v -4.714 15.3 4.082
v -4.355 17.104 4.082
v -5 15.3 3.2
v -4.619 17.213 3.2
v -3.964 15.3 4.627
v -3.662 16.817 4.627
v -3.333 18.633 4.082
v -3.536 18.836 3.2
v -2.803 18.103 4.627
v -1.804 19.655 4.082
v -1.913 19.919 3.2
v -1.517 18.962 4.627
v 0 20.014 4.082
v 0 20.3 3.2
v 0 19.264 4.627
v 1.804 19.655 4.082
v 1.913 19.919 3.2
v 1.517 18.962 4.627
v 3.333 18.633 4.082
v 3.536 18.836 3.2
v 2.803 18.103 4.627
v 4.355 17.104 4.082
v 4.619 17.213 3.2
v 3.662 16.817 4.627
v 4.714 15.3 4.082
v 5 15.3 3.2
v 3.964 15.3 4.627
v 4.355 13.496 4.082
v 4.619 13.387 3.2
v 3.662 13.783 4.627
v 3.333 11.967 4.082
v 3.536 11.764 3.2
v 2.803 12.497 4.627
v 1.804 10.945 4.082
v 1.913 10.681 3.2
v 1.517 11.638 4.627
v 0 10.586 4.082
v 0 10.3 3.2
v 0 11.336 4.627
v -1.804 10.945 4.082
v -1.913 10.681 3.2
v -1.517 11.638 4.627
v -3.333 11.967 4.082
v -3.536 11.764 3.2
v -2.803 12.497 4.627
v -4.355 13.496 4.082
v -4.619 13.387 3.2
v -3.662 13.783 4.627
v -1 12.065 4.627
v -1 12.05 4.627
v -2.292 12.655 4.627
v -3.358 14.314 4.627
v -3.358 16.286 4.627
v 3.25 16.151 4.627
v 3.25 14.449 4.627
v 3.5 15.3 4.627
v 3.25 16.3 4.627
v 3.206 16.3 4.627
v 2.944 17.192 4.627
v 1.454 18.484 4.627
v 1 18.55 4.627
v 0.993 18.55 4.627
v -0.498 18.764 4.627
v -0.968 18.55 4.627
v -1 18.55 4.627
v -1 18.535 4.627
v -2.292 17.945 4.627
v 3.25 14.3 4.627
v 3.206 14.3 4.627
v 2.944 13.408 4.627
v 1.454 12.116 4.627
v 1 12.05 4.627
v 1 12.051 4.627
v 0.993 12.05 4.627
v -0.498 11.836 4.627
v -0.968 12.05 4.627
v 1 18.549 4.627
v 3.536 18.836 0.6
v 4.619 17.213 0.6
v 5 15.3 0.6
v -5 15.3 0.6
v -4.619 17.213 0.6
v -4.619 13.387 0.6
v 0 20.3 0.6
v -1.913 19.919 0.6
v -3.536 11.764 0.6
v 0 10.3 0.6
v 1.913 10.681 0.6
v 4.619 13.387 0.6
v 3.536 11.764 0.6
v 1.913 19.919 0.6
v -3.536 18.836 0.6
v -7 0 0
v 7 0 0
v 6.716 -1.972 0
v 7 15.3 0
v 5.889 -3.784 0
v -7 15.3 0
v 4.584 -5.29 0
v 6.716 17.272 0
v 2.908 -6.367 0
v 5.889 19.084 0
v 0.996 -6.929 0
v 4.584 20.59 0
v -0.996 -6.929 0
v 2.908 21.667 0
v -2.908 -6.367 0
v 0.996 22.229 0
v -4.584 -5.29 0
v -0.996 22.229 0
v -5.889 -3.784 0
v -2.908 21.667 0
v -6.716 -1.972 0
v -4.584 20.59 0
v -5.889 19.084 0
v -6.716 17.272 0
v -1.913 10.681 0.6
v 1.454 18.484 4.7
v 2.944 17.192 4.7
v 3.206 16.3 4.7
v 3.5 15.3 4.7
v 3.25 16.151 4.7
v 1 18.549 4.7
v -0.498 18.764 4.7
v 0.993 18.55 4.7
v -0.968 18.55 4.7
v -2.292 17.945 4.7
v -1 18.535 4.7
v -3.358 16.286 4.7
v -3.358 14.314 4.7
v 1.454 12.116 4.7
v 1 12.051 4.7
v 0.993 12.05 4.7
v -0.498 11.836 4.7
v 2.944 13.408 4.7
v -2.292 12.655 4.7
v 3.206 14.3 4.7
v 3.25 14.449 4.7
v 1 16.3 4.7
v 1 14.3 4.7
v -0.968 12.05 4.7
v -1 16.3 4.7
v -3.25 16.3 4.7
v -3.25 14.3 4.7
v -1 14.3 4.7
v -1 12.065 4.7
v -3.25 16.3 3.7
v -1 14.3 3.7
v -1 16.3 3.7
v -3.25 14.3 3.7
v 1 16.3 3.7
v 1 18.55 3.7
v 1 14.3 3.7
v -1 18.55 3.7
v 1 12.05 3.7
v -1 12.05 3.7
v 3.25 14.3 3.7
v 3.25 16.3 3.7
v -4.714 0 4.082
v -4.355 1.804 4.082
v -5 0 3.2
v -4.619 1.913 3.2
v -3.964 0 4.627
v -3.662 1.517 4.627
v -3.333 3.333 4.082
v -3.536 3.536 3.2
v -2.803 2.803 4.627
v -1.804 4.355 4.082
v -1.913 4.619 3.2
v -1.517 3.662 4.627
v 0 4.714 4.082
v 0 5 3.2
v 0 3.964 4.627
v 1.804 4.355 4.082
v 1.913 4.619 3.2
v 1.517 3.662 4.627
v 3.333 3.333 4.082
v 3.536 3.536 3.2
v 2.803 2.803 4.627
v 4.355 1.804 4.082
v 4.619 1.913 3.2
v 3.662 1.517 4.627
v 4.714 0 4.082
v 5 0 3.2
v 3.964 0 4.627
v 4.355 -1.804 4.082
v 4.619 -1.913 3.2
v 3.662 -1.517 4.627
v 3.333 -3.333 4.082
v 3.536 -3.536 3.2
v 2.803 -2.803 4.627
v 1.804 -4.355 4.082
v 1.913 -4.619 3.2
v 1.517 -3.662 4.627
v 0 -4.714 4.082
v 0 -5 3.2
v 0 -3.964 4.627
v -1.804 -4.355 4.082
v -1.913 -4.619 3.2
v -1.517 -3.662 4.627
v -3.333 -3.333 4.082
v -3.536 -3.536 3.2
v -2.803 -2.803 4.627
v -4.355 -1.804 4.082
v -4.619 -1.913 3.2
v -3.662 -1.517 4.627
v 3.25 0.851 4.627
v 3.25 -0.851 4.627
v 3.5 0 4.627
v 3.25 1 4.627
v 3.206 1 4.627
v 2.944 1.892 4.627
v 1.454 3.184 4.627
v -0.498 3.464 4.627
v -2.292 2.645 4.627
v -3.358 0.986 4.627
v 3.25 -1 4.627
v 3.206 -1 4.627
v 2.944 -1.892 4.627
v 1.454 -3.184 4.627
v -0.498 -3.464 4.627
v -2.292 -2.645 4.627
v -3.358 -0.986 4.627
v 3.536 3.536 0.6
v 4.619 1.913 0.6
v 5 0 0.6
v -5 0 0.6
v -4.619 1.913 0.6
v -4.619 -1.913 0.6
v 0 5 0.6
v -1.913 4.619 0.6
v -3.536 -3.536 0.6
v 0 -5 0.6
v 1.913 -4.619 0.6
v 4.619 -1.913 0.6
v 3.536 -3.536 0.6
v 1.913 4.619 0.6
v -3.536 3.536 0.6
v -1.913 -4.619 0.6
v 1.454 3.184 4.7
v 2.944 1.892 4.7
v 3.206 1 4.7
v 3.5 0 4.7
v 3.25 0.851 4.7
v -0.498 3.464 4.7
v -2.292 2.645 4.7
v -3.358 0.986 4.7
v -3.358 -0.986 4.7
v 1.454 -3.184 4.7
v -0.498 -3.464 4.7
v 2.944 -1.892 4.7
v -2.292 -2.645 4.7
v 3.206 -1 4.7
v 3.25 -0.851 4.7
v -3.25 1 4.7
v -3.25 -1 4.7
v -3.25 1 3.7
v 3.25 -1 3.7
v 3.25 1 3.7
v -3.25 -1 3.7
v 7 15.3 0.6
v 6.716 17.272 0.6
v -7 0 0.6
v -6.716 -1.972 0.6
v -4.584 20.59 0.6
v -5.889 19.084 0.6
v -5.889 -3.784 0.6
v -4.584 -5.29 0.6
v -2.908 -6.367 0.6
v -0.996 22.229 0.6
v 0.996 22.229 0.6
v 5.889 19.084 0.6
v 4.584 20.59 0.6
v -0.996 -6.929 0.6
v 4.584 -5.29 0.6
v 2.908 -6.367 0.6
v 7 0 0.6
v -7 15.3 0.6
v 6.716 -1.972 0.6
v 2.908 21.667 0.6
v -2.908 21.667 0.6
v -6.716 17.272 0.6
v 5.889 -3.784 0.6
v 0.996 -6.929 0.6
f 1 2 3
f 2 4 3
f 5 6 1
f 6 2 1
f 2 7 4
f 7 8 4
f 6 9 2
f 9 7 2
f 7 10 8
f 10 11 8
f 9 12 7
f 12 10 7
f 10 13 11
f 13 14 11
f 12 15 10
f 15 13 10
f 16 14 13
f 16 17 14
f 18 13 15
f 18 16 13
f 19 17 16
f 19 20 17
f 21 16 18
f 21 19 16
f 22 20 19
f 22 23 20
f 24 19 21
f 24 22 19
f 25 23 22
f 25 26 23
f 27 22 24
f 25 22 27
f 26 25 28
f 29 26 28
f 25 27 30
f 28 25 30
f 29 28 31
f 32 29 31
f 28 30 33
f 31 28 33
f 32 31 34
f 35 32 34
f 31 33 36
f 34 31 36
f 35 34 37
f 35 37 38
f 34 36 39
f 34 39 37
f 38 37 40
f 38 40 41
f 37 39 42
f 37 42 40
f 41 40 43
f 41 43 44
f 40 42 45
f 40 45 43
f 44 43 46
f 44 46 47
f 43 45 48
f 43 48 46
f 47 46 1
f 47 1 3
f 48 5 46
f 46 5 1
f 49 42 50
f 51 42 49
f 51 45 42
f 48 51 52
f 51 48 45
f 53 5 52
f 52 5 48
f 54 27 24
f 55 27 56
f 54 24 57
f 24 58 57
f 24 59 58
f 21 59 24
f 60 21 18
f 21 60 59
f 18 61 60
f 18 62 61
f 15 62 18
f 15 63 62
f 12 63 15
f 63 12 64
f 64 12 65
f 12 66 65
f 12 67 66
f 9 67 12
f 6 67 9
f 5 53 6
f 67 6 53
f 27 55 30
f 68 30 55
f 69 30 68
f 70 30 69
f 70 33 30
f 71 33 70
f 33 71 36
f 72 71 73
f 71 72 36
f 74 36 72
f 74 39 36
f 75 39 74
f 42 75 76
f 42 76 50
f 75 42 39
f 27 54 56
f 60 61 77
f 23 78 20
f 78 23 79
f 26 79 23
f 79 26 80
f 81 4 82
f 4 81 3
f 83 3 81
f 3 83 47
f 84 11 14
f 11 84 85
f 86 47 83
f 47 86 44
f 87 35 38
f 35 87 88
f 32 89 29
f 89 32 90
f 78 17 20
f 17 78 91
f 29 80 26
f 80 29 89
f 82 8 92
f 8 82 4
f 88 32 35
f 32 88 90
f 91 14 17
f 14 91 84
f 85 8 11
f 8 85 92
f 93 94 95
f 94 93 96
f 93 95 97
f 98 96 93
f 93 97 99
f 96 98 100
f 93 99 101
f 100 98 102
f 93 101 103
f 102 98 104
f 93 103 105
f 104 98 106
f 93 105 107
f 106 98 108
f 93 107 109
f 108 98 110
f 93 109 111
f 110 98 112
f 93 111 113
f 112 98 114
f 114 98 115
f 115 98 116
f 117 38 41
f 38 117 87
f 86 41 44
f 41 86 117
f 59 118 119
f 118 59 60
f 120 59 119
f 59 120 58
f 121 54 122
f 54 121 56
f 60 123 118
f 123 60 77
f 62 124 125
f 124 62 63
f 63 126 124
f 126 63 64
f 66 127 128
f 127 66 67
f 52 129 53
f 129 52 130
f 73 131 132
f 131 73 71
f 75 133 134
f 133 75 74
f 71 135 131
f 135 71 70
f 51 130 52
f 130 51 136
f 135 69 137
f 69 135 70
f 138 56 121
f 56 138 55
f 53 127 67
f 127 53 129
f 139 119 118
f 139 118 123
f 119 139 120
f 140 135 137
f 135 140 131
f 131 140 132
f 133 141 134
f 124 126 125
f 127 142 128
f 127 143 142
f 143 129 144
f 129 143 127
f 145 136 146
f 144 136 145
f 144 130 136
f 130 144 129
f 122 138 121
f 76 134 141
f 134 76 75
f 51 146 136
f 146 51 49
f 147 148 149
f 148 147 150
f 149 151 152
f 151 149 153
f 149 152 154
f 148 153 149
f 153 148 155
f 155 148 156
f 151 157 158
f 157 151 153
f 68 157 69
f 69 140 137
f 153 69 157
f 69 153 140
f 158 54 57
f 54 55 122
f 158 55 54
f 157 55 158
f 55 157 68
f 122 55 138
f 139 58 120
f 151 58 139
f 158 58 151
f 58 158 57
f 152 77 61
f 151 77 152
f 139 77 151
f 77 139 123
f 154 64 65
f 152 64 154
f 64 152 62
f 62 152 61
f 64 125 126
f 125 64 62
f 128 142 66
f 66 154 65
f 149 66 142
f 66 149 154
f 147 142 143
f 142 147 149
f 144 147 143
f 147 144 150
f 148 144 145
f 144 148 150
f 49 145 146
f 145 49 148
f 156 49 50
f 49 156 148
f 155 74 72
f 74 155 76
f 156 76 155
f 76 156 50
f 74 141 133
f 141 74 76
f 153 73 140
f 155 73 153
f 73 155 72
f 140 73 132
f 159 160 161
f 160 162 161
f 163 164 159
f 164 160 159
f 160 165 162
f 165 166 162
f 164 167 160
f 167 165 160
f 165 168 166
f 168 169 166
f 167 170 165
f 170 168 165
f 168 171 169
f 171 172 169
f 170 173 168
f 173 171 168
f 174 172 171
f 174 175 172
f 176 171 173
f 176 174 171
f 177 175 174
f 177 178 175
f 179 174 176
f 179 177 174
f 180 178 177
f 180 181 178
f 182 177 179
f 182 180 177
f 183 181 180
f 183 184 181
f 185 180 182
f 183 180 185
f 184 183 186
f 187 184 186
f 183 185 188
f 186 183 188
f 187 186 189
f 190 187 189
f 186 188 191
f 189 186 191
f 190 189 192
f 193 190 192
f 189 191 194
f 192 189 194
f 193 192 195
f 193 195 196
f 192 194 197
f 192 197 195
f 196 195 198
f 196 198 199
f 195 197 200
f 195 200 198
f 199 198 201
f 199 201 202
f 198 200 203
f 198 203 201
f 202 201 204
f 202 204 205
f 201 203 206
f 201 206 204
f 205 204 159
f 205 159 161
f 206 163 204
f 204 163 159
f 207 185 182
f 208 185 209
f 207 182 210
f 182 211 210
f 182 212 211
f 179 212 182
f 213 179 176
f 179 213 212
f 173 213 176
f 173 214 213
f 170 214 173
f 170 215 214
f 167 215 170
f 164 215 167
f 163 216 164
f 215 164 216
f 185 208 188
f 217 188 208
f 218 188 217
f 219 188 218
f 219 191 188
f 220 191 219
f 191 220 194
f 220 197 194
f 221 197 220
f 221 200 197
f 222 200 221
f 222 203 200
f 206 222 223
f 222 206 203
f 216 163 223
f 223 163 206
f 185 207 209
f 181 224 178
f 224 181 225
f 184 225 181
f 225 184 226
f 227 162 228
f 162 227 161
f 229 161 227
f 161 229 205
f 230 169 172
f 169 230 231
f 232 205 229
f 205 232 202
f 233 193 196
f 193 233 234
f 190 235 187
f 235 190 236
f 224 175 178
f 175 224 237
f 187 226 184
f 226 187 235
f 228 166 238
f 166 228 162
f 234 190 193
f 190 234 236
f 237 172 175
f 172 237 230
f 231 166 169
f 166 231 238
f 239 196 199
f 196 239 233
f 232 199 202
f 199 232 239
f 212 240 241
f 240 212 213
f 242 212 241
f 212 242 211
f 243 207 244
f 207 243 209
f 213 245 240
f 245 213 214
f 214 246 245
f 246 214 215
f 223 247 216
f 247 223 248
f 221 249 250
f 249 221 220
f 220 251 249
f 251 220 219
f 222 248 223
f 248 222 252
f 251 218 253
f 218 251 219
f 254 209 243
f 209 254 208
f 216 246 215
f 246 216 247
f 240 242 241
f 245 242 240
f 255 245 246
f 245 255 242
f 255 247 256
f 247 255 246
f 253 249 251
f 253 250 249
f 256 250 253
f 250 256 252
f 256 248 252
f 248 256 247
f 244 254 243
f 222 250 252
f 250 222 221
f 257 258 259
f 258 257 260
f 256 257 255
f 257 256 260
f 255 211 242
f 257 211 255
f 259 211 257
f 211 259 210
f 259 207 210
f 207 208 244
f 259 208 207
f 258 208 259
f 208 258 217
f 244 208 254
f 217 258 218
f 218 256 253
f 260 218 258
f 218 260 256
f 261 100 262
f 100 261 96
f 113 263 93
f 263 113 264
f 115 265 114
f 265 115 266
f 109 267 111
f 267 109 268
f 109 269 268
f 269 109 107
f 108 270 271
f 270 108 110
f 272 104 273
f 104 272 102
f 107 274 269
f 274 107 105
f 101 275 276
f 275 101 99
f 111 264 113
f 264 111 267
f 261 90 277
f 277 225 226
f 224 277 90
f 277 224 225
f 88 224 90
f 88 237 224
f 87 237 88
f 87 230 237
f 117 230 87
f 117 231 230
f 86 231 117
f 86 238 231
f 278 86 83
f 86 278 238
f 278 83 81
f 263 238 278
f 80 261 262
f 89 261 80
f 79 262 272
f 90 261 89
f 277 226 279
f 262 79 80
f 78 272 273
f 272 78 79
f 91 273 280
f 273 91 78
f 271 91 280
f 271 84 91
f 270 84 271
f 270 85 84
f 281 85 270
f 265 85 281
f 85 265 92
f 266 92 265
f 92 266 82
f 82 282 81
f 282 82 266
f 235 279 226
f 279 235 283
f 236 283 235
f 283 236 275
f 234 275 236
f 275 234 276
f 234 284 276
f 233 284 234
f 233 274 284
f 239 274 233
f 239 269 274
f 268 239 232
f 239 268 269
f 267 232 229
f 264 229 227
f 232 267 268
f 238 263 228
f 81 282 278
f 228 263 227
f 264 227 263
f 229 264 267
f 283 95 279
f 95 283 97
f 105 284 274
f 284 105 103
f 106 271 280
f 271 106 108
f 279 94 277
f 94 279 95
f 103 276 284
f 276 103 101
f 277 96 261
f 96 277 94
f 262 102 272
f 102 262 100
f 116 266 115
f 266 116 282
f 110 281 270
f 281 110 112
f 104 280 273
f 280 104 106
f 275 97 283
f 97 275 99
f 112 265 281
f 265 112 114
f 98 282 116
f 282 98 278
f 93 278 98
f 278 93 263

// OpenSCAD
pitch=2.55;
width = 10;
thickness=0.6;
height=thickness + 4.1;
extra=2;
roundness=1.5;
textHeight=1;

module button(x,y)
{
    translate( [x*pitch, y*pitch] ) {
        difference() {
            union() {
                translate( [0,0,height-roundness] ) rotate_extrude( angle = 360, convexity = 6 ) {
                    translate( [width/2-roundness,0] ) circle( r=roundness, $fn=10 );
                }
                cylinder( d=width, h=height-roundness );
                cylinder( d=width-roundness*2, h=height );
            }
            translate( [0,0,height-textHeight] ) linear_extrude( textHeight+1 ) children();
        }
    }
}

module base(x,y)
{
    translate( [x*pitch, y*pitch] ) {
        cylinder( d=width+extra*2, thickness );
    }
}

module letter( t )
{
    text( t=t, halign="center", valign="center" );
}

module arrow()
{
    circle( d= width-roundness-2, $fn=3 );
}

module minus()
{
    square( [width-roundness-2, 2], center=true );
}

module plus()
{
    minus();
    rotate( 90 ) minus();
}

module power()
{
    button(0,0) letter("x");
    button(15,0) letter("X");
    
    hull() {
        base(0,0);
        base(15,0);
    }
}

module three()
{
    button(0,0);
    button(0,4);
    button(0,8);

    hull() {
        base(0,0);
        base(0,8);
    }
}

module leftRight()
{    
    button(5,-3) rotate(180) arrow();
    button(10,-3) arrow();
    
    hull() {
        base(5,-3);
        base(10,-3);
    }
}


module volume()
{    
    button(0,6) plus();
    button(0,0) minus();
    
    hull() {
        base(0,6);
        base(0,0);
    }
}

module arrows()
{
    button(0,0) letter("ok");
    button(-4,0) rotate(180) arrow();
    button(4,0) arrow();
    button(0,4) rotate(90) arrow();
    button(0,-4) rotate(-90) arrow();
    
    hull() {
        base(4,0);
        base(-4,0);
    }
    hull() {
        base(0,4);
        base(0,-4);
    }
}

//power();
//leftRight();
//arrows();
//three();
volume();
